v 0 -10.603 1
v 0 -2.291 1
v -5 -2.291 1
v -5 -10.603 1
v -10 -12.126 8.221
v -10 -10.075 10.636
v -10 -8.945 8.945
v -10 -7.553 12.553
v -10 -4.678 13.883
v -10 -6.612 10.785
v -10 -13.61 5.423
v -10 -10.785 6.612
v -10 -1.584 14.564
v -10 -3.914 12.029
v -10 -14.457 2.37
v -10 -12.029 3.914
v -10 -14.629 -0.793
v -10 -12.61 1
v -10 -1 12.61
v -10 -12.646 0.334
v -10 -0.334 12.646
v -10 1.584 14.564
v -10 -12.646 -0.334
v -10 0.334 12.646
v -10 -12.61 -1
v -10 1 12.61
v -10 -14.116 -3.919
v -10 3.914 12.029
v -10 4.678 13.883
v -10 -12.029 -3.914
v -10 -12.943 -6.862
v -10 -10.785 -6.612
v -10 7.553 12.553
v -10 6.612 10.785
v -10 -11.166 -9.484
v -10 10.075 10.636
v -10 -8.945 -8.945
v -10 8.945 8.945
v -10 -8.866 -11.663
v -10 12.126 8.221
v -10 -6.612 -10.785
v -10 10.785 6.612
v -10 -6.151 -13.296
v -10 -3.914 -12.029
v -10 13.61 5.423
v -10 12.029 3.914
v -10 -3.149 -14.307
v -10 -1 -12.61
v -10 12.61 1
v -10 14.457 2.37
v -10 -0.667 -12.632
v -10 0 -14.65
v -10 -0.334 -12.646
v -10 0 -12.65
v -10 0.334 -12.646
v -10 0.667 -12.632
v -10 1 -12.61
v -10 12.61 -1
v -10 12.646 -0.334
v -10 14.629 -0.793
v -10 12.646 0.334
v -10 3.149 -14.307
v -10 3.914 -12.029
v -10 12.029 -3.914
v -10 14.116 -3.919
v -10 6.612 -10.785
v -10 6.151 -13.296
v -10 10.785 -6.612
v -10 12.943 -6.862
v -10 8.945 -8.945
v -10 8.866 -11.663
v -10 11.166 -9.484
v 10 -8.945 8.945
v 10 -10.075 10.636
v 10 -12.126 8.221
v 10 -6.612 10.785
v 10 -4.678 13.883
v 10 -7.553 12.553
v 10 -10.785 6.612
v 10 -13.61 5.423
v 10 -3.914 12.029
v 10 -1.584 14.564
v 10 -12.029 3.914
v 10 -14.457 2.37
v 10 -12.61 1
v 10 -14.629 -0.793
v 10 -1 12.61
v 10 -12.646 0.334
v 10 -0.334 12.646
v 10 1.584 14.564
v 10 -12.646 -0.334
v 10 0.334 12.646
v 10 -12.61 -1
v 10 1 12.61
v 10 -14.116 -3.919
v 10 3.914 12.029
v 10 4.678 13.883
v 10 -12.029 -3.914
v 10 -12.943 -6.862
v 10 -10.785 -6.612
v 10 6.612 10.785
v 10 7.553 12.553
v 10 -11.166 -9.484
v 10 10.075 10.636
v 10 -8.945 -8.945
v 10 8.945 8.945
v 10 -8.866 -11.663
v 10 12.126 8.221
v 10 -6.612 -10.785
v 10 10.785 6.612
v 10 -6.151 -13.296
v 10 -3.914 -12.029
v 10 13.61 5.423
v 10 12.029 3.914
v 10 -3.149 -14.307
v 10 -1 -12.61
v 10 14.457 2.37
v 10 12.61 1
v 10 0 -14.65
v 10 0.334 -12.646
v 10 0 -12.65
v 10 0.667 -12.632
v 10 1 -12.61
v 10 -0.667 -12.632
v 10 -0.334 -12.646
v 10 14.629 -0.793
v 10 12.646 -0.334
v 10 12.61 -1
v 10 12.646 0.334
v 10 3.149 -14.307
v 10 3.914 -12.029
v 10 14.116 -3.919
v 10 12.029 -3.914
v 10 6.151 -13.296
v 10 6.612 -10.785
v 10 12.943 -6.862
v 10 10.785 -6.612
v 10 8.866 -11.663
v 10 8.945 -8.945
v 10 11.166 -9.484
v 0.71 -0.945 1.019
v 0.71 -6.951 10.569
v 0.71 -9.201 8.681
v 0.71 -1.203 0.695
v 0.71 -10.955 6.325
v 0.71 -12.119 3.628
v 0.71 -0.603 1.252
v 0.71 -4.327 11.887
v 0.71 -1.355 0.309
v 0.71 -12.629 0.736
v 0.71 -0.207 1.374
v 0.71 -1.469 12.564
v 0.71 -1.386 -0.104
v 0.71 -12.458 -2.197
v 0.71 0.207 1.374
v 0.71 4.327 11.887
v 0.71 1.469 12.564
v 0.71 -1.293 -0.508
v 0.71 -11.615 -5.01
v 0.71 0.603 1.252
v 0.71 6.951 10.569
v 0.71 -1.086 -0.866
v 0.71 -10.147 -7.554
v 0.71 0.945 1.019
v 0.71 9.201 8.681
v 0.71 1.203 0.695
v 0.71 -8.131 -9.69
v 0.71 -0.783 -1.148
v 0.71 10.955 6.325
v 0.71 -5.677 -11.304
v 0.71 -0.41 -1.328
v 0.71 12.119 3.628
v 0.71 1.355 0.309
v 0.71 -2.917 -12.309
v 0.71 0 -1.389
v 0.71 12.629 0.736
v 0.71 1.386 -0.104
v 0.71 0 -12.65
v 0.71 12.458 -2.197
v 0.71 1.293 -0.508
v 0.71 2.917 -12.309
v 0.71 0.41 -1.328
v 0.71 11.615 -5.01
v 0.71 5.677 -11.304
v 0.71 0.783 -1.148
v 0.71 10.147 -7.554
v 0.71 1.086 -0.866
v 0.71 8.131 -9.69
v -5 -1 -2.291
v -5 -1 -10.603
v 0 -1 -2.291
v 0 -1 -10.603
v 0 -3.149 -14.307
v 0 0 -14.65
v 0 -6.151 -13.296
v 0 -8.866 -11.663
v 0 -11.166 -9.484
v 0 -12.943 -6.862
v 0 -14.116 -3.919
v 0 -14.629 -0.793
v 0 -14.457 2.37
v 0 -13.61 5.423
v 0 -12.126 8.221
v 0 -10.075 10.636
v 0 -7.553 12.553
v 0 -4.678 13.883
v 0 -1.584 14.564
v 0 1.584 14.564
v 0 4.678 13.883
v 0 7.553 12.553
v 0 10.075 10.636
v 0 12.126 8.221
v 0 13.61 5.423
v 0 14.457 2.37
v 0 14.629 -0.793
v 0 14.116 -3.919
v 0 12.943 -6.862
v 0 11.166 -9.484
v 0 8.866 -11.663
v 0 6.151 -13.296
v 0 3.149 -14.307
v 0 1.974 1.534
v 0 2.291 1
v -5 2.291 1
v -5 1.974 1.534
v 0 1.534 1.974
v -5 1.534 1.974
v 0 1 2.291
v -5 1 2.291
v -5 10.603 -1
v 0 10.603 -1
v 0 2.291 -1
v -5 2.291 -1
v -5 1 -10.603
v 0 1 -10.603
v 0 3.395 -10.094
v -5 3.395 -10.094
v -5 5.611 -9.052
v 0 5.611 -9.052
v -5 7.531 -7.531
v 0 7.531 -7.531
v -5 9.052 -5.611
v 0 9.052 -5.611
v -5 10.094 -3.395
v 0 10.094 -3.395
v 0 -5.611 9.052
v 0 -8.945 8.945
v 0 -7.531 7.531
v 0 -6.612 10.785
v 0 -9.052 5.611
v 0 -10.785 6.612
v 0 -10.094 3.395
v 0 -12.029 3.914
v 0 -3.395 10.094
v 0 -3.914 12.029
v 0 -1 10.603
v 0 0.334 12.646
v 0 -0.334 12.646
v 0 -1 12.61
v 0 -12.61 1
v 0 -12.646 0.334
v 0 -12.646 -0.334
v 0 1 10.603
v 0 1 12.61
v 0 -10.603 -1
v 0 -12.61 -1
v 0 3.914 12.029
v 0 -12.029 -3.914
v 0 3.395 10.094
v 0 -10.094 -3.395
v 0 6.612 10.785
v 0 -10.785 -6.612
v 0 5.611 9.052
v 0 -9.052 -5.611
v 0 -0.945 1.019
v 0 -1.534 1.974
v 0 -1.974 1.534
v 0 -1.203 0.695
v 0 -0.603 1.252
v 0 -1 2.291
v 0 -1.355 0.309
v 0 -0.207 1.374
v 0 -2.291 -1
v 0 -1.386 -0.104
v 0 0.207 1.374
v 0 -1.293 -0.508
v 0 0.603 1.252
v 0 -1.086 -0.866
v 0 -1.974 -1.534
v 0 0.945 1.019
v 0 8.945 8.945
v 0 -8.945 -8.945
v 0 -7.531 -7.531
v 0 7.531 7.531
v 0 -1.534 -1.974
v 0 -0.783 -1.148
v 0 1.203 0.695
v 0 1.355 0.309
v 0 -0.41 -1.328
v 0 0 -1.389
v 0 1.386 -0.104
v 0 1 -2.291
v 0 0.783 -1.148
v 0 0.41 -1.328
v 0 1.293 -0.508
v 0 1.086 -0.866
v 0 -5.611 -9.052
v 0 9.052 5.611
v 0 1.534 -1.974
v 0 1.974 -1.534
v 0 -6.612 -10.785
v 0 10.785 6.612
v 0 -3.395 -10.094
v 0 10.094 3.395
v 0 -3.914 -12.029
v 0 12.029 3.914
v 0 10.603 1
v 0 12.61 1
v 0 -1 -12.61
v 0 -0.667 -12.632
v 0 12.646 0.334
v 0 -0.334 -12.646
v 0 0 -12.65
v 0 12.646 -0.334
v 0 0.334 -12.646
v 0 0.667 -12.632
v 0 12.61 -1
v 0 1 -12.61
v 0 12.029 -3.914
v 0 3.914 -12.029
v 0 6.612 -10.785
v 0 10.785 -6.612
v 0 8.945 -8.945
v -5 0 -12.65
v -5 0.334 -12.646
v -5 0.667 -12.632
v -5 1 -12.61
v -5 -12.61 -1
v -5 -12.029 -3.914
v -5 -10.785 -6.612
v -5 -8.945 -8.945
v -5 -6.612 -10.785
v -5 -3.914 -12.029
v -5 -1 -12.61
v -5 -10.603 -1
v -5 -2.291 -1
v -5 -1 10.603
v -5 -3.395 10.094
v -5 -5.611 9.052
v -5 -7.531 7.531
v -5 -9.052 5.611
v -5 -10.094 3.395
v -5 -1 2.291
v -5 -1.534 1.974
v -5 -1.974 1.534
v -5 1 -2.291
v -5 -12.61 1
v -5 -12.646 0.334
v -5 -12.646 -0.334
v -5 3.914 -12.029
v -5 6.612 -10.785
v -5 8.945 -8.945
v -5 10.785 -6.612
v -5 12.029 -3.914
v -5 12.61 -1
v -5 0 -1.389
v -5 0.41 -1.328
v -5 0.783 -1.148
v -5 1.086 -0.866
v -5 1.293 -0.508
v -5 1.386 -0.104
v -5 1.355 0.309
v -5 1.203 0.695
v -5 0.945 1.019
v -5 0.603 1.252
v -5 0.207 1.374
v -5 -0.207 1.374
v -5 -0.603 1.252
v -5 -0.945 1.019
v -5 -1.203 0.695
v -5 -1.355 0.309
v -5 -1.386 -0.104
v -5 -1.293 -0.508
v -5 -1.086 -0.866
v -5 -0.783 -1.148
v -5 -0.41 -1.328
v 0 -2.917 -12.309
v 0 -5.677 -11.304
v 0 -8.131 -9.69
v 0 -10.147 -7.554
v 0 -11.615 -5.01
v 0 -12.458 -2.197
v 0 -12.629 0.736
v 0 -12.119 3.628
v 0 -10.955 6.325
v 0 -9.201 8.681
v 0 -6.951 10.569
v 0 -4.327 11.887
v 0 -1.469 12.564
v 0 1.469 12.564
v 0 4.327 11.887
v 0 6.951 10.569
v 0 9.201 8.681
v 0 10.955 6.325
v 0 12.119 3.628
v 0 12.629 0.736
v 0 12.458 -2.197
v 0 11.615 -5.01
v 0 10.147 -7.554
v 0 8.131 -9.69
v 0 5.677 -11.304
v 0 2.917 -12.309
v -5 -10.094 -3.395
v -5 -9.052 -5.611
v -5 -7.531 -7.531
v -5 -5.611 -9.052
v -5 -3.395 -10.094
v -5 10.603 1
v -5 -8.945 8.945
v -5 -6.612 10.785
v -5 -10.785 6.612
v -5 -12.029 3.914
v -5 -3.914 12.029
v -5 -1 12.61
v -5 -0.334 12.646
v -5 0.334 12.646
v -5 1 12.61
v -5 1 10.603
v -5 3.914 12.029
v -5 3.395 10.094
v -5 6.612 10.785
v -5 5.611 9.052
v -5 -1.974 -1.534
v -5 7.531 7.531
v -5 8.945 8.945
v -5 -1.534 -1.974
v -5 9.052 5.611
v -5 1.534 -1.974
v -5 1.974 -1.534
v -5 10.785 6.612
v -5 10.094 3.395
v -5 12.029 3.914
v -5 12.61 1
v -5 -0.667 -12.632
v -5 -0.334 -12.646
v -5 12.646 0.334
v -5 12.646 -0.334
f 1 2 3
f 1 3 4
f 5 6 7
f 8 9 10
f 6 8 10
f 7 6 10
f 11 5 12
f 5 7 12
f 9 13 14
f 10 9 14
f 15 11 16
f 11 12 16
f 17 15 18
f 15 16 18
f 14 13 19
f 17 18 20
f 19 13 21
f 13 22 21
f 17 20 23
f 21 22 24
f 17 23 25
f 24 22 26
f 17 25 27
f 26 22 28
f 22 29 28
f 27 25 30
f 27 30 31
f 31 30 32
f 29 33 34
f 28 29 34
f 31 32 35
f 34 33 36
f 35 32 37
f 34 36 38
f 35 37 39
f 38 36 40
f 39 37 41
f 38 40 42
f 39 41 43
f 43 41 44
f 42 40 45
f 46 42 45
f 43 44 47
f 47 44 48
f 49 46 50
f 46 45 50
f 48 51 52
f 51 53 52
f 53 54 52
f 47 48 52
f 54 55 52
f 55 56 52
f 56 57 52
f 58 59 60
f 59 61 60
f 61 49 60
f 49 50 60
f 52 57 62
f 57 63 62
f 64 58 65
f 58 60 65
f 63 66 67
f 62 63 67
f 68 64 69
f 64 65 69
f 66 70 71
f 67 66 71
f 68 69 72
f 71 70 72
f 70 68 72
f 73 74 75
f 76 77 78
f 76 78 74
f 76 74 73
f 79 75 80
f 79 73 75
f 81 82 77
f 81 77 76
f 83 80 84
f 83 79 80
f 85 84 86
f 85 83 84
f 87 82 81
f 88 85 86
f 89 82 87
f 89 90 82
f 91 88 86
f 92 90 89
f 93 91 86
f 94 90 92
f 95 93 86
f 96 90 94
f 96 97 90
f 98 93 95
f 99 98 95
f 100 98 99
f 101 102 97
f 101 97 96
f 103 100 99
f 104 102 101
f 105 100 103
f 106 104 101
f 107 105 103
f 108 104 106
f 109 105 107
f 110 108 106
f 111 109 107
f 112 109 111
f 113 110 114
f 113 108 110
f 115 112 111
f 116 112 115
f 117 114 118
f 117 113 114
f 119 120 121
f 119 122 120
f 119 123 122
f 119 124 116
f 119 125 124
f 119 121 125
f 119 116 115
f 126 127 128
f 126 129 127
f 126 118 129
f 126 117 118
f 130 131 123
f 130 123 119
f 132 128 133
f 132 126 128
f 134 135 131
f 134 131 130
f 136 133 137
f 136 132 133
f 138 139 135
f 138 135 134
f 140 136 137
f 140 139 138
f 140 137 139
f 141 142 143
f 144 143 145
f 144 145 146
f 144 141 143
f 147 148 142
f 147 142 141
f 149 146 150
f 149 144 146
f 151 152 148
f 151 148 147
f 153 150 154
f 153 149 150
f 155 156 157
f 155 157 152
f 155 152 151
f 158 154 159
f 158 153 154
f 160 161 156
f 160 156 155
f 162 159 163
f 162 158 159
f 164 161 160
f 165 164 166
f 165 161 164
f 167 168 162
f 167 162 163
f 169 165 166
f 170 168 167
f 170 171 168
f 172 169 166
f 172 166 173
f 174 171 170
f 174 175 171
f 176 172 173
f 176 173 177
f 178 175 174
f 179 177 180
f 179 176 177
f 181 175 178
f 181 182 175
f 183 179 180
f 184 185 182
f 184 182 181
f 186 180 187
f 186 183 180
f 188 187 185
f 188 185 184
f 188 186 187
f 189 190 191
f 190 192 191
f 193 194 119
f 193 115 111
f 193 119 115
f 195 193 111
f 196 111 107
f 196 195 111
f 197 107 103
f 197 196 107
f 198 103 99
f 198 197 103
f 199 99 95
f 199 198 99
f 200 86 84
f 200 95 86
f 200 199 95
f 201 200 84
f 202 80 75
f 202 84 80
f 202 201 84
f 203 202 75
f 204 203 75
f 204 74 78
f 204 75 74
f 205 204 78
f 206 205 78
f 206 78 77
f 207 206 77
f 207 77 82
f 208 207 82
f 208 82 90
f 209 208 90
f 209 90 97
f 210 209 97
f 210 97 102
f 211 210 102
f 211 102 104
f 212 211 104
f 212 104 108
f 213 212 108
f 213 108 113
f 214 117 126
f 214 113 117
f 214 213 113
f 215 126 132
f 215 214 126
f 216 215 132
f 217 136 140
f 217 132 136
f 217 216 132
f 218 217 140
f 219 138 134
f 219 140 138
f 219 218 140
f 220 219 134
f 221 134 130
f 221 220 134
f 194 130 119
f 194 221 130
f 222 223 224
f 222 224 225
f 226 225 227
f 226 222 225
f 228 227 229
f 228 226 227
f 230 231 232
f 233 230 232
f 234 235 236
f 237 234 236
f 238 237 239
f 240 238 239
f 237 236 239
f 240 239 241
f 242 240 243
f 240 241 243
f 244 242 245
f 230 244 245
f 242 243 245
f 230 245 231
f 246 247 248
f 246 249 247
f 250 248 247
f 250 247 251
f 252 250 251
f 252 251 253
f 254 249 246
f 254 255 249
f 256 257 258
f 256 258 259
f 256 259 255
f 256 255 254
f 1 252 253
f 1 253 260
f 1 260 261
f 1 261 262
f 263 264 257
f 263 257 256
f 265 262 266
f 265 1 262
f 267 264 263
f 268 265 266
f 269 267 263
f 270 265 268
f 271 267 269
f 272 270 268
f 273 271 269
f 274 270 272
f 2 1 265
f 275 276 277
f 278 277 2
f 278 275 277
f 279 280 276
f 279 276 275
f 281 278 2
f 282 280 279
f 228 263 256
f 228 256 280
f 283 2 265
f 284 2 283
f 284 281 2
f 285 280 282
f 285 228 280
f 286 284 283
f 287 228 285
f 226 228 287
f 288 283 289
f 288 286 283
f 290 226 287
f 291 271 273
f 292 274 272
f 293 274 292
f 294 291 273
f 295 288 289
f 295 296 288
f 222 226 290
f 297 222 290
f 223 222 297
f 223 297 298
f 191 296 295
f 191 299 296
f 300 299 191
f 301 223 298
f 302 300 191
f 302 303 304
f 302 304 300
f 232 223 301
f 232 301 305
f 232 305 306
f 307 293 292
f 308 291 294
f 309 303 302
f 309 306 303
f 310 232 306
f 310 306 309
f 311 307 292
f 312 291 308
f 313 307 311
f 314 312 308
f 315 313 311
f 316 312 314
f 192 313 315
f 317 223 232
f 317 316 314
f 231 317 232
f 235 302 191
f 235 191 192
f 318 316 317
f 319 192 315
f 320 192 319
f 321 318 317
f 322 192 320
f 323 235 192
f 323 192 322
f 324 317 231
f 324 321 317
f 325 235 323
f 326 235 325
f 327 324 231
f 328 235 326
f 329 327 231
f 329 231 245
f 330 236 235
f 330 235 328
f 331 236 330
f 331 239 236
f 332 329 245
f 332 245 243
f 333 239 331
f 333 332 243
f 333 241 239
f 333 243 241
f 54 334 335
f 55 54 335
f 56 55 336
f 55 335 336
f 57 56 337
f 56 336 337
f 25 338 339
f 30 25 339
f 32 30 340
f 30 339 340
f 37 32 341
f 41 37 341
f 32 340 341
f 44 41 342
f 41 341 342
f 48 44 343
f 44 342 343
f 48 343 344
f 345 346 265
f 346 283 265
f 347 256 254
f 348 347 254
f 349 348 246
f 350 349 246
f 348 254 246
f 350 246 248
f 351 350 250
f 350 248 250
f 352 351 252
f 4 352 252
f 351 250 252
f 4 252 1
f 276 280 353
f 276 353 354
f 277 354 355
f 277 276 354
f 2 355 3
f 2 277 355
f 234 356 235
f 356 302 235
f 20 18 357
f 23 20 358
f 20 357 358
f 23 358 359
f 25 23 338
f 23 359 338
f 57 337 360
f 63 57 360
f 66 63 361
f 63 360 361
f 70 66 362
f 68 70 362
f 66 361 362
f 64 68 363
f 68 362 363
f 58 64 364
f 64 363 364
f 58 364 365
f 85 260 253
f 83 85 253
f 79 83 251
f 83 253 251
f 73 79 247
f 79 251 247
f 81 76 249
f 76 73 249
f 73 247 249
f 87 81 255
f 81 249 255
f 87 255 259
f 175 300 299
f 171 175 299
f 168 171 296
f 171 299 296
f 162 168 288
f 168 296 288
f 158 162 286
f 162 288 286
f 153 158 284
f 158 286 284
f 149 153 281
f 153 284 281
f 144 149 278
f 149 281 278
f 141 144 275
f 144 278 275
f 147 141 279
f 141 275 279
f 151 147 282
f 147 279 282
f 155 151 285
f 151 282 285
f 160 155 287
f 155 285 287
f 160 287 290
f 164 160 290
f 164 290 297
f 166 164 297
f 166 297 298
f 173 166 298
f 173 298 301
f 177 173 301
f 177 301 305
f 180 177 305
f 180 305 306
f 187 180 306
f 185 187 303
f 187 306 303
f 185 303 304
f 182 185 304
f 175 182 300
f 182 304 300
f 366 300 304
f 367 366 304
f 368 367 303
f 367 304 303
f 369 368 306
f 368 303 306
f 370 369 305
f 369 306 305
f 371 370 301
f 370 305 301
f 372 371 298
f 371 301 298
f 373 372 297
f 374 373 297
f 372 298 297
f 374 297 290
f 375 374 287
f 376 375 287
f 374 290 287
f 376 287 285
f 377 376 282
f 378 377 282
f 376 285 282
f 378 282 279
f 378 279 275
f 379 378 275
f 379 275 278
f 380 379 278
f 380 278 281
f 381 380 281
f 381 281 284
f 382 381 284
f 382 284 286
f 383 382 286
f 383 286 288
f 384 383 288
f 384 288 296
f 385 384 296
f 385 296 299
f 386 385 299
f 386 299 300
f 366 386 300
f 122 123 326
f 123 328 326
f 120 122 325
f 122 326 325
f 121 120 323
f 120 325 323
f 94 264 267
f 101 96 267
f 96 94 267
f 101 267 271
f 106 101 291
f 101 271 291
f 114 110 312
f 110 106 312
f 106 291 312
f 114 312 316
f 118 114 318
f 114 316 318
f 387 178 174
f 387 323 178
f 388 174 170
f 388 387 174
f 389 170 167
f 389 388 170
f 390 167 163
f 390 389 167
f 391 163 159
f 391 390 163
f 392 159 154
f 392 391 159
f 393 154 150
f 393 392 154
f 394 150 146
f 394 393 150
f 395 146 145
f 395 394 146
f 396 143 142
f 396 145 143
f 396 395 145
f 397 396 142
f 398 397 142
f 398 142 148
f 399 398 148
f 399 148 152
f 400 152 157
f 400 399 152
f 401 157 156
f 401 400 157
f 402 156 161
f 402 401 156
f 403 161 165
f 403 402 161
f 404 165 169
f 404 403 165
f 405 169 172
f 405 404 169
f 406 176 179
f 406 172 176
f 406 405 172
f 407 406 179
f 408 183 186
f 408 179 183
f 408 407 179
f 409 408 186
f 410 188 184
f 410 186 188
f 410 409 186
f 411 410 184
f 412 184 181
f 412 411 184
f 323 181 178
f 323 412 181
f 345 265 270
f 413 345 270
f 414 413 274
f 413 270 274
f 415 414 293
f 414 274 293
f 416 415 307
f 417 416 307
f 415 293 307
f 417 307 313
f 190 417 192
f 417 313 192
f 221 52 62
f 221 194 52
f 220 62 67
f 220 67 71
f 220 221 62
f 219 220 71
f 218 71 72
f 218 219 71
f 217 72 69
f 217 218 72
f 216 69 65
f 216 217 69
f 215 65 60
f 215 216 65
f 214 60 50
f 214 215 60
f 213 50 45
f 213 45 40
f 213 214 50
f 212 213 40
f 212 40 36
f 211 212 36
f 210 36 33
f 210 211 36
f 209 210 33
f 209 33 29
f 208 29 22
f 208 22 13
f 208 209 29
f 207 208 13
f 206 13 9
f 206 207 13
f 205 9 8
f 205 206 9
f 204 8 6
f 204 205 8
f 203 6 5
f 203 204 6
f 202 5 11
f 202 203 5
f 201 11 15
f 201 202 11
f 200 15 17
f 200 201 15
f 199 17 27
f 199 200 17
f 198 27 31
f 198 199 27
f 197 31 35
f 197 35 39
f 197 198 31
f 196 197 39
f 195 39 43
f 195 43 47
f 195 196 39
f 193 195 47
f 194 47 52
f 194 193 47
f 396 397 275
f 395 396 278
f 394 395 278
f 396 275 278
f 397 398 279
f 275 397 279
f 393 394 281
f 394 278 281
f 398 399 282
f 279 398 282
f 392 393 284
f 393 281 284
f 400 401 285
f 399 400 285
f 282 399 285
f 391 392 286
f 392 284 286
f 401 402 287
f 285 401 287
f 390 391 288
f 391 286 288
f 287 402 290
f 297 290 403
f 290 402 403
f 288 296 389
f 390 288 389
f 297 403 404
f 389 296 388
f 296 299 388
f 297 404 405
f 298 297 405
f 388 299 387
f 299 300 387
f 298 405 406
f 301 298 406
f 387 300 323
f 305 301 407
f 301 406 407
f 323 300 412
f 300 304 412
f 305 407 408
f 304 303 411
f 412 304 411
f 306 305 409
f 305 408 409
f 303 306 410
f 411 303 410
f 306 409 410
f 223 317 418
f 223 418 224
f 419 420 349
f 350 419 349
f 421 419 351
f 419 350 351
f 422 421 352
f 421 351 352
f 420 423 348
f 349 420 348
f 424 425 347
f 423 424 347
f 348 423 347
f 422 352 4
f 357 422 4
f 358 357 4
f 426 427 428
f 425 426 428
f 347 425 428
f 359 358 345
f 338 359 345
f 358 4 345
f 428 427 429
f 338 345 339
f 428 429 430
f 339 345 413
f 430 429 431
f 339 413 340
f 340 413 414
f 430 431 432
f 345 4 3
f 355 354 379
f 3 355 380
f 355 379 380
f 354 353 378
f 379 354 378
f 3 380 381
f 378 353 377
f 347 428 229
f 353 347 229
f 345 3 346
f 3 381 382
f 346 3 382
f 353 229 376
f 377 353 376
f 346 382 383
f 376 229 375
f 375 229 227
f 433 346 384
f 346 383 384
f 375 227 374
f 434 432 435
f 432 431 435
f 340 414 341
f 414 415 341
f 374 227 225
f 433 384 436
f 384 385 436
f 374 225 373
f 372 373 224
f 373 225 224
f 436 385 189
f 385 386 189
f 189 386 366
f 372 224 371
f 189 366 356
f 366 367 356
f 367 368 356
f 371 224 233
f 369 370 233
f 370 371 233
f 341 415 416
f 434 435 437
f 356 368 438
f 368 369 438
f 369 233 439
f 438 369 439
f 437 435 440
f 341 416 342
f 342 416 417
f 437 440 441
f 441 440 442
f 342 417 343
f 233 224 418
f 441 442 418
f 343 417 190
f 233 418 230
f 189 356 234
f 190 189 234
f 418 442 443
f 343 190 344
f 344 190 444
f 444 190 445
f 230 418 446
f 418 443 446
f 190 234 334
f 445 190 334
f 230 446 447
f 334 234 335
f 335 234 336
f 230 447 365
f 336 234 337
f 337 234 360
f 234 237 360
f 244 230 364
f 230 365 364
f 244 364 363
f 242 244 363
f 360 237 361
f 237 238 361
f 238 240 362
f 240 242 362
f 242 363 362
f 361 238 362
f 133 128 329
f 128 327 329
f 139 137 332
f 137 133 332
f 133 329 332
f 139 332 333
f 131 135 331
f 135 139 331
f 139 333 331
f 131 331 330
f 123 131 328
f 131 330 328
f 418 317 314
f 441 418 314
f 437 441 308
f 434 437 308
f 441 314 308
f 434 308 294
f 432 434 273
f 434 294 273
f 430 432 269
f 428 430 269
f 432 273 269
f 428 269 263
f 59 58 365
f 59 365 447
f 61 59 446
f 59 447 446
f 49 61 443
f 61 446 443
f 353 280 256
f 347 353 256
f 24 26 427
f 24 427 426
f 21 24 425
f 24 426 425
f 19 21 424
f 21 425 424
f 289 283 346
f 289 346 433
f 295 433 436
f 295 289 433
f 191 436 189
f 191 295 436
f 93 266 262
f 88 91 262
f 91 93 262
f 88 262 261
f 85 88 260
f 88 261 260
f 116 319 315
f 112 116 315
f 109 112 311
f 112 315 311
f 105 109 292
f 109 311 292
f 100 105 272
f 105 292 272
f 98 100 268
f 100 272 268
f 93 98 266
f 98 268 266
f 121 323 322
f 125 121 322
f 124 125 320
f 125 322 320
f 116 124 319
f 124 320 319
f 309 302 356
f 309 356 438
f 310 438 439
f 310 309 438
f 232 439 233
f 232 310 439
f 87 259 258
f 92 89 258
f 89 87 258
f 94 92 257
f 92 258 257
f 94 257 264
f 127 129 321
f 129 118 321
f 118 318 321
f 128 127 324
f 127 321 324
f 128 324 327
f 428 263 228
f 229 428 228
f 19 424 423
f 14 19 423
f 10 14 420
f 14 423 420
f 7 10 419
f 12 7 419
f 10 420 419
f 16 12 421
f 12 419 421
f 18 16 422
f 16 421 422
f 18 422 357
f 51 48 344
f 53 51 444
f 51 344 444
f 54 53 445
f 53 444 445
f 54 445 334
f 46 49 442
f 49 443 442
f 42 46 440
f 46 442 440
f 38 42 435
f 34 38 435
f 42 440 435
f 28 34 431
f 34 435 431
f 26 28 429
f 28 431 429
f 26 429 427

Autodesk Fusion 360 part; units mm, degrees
sketch "Sketch1" plane through (0, 0, 0) normal (1, 0, 0) x (0, 0, -1)
  circle A0 centre (0, 0) radius 12.65
  circle A1 centre (0, 0) radius 14.65
  line L0 (0, 0) -> (0, 12.65) construction
  line L1 (0, 0) -> (0, -12.65) construction
  line L2 (-1, 12.6104) -> (-1, -12.6104)
  line L3 (1, 12.6104) -> (1, -12.6104)
  line L4 (0, 0) -> (12.65, 0) construction
  line L5 (0, 0) -> (-12.65, 0) construction
  line L6 (12.6104, -1) -> (-12.6104, -1)
  line L7 (-12.6104, 1) -> (12.6104, 1)
  circle A2 centre (0, 0) radius 2.5
  circle A3 centre (0, 0) radius 10.65
  circle A4 centre (0, 0) radius 1.3894
  dimension "d1" = 25.3
  dimension "d2" = 2
  dimension "d3" = 2
  dimension "d4" = 2
  dimension "d5" = 5
  dimension "d6" = 2
  dimension "d7" = 2.7788
extrude "Extrude1" add sketch "Sketch1" along normal mid plane 20 makes body 1
extrude "Extrude2" add sketch "Sketch1" against normal blind 5 contours A0 L6 L7 A3 | A0 L3 L7 A3 | A0 L3 L6 A3 | A0 L2 L3 A3 | L6 L7 A2 A3 | A0 L2 L3 A3 | A0 L2 L7 A3 | L2 L3 A2 A3 | L3 L6 L7 A2 A4 | L3 L7 A2 | A0 L2 L6 A3 | L2 L3 A2 A3 | L3 L6 A2 | A0 L6 L7 A3 | L2 L3 L7 A2 A4 | L3 L7 A4 | L2 L3 L6 A2 A4 | L3 L6 A4 | L6 L7 A2 A3 | L2 L7 A2 | L2 L6 A2 | L2 L6 L7 A2 A4 | L2 L7 A4 | L2 L6 A4 bodies 1
sketch "Sketch2" plane through (0, 0, 0) normal (1, 0, 0) x (0, 0, -1)
  circle A0 centre (0, 0) radius 1.3894
  arc A1 (-10.6029, -1) -> (-1, -10.6029) centre (0, 0) ccw
  line L0 (-10.6029, -1) -> (-2.2913, -1)
  arc A2 (-2.2913, -1) -> (-1, -2.2913) centre (0, 0) ccw
  line L1 (-1, -2.2913) -> (-1, -10.6029)
  line L2 (10.6029, 1) -> (2.2913, 1)
  arc A3 (2.2913, 1) -> (1, 2.2913) centre (0, 0) ccw
  line L3 (1, 2.2913) -> (1, 10.6029)
  arc A4 (10.6029, 1) -> (1, 10.6029) centre (0, 0) ccw
  line L4 (1, -10.6029) -> (1, -2.2913)
  arc A5 (1, -2.2913) -> (2.2913, -1) centre (0, 0) ccw
  line L5 (2.2913, -1) -> (10.6029, -1)
  arc A6 (1, -10.6029) -> (10.6029, -1) centre (0, 0) ccw
  line L6 (-2.2913, 1) -> (-10.6029, 1)
  arc A7 (-1, 10.6029) -> (-10.6029, 1) centre (0, 0) ccw
  line L7 (-1, 10.6029) -> (-1, 2.2913)
  arc A8 (-1, 2.2913) -> (-2.2913, 1) centre (0, 0) ccw
  circle A9 centre (0, 0) radius 12.65
extrude "Extrude1'" add sketch "Sketch2" along normal blind 0.71 separate body contours A1 L0 A2 L1 | L2 A3 L3 A4 | L4 A5 L5 A6 | L6 A7 L7 A8 | A9 makes body 2 in component "Component"
component "Component" placed x (1, 0, 0) y (0, 1, 0) z (0, 0, 1) at (0, 0, 0)
